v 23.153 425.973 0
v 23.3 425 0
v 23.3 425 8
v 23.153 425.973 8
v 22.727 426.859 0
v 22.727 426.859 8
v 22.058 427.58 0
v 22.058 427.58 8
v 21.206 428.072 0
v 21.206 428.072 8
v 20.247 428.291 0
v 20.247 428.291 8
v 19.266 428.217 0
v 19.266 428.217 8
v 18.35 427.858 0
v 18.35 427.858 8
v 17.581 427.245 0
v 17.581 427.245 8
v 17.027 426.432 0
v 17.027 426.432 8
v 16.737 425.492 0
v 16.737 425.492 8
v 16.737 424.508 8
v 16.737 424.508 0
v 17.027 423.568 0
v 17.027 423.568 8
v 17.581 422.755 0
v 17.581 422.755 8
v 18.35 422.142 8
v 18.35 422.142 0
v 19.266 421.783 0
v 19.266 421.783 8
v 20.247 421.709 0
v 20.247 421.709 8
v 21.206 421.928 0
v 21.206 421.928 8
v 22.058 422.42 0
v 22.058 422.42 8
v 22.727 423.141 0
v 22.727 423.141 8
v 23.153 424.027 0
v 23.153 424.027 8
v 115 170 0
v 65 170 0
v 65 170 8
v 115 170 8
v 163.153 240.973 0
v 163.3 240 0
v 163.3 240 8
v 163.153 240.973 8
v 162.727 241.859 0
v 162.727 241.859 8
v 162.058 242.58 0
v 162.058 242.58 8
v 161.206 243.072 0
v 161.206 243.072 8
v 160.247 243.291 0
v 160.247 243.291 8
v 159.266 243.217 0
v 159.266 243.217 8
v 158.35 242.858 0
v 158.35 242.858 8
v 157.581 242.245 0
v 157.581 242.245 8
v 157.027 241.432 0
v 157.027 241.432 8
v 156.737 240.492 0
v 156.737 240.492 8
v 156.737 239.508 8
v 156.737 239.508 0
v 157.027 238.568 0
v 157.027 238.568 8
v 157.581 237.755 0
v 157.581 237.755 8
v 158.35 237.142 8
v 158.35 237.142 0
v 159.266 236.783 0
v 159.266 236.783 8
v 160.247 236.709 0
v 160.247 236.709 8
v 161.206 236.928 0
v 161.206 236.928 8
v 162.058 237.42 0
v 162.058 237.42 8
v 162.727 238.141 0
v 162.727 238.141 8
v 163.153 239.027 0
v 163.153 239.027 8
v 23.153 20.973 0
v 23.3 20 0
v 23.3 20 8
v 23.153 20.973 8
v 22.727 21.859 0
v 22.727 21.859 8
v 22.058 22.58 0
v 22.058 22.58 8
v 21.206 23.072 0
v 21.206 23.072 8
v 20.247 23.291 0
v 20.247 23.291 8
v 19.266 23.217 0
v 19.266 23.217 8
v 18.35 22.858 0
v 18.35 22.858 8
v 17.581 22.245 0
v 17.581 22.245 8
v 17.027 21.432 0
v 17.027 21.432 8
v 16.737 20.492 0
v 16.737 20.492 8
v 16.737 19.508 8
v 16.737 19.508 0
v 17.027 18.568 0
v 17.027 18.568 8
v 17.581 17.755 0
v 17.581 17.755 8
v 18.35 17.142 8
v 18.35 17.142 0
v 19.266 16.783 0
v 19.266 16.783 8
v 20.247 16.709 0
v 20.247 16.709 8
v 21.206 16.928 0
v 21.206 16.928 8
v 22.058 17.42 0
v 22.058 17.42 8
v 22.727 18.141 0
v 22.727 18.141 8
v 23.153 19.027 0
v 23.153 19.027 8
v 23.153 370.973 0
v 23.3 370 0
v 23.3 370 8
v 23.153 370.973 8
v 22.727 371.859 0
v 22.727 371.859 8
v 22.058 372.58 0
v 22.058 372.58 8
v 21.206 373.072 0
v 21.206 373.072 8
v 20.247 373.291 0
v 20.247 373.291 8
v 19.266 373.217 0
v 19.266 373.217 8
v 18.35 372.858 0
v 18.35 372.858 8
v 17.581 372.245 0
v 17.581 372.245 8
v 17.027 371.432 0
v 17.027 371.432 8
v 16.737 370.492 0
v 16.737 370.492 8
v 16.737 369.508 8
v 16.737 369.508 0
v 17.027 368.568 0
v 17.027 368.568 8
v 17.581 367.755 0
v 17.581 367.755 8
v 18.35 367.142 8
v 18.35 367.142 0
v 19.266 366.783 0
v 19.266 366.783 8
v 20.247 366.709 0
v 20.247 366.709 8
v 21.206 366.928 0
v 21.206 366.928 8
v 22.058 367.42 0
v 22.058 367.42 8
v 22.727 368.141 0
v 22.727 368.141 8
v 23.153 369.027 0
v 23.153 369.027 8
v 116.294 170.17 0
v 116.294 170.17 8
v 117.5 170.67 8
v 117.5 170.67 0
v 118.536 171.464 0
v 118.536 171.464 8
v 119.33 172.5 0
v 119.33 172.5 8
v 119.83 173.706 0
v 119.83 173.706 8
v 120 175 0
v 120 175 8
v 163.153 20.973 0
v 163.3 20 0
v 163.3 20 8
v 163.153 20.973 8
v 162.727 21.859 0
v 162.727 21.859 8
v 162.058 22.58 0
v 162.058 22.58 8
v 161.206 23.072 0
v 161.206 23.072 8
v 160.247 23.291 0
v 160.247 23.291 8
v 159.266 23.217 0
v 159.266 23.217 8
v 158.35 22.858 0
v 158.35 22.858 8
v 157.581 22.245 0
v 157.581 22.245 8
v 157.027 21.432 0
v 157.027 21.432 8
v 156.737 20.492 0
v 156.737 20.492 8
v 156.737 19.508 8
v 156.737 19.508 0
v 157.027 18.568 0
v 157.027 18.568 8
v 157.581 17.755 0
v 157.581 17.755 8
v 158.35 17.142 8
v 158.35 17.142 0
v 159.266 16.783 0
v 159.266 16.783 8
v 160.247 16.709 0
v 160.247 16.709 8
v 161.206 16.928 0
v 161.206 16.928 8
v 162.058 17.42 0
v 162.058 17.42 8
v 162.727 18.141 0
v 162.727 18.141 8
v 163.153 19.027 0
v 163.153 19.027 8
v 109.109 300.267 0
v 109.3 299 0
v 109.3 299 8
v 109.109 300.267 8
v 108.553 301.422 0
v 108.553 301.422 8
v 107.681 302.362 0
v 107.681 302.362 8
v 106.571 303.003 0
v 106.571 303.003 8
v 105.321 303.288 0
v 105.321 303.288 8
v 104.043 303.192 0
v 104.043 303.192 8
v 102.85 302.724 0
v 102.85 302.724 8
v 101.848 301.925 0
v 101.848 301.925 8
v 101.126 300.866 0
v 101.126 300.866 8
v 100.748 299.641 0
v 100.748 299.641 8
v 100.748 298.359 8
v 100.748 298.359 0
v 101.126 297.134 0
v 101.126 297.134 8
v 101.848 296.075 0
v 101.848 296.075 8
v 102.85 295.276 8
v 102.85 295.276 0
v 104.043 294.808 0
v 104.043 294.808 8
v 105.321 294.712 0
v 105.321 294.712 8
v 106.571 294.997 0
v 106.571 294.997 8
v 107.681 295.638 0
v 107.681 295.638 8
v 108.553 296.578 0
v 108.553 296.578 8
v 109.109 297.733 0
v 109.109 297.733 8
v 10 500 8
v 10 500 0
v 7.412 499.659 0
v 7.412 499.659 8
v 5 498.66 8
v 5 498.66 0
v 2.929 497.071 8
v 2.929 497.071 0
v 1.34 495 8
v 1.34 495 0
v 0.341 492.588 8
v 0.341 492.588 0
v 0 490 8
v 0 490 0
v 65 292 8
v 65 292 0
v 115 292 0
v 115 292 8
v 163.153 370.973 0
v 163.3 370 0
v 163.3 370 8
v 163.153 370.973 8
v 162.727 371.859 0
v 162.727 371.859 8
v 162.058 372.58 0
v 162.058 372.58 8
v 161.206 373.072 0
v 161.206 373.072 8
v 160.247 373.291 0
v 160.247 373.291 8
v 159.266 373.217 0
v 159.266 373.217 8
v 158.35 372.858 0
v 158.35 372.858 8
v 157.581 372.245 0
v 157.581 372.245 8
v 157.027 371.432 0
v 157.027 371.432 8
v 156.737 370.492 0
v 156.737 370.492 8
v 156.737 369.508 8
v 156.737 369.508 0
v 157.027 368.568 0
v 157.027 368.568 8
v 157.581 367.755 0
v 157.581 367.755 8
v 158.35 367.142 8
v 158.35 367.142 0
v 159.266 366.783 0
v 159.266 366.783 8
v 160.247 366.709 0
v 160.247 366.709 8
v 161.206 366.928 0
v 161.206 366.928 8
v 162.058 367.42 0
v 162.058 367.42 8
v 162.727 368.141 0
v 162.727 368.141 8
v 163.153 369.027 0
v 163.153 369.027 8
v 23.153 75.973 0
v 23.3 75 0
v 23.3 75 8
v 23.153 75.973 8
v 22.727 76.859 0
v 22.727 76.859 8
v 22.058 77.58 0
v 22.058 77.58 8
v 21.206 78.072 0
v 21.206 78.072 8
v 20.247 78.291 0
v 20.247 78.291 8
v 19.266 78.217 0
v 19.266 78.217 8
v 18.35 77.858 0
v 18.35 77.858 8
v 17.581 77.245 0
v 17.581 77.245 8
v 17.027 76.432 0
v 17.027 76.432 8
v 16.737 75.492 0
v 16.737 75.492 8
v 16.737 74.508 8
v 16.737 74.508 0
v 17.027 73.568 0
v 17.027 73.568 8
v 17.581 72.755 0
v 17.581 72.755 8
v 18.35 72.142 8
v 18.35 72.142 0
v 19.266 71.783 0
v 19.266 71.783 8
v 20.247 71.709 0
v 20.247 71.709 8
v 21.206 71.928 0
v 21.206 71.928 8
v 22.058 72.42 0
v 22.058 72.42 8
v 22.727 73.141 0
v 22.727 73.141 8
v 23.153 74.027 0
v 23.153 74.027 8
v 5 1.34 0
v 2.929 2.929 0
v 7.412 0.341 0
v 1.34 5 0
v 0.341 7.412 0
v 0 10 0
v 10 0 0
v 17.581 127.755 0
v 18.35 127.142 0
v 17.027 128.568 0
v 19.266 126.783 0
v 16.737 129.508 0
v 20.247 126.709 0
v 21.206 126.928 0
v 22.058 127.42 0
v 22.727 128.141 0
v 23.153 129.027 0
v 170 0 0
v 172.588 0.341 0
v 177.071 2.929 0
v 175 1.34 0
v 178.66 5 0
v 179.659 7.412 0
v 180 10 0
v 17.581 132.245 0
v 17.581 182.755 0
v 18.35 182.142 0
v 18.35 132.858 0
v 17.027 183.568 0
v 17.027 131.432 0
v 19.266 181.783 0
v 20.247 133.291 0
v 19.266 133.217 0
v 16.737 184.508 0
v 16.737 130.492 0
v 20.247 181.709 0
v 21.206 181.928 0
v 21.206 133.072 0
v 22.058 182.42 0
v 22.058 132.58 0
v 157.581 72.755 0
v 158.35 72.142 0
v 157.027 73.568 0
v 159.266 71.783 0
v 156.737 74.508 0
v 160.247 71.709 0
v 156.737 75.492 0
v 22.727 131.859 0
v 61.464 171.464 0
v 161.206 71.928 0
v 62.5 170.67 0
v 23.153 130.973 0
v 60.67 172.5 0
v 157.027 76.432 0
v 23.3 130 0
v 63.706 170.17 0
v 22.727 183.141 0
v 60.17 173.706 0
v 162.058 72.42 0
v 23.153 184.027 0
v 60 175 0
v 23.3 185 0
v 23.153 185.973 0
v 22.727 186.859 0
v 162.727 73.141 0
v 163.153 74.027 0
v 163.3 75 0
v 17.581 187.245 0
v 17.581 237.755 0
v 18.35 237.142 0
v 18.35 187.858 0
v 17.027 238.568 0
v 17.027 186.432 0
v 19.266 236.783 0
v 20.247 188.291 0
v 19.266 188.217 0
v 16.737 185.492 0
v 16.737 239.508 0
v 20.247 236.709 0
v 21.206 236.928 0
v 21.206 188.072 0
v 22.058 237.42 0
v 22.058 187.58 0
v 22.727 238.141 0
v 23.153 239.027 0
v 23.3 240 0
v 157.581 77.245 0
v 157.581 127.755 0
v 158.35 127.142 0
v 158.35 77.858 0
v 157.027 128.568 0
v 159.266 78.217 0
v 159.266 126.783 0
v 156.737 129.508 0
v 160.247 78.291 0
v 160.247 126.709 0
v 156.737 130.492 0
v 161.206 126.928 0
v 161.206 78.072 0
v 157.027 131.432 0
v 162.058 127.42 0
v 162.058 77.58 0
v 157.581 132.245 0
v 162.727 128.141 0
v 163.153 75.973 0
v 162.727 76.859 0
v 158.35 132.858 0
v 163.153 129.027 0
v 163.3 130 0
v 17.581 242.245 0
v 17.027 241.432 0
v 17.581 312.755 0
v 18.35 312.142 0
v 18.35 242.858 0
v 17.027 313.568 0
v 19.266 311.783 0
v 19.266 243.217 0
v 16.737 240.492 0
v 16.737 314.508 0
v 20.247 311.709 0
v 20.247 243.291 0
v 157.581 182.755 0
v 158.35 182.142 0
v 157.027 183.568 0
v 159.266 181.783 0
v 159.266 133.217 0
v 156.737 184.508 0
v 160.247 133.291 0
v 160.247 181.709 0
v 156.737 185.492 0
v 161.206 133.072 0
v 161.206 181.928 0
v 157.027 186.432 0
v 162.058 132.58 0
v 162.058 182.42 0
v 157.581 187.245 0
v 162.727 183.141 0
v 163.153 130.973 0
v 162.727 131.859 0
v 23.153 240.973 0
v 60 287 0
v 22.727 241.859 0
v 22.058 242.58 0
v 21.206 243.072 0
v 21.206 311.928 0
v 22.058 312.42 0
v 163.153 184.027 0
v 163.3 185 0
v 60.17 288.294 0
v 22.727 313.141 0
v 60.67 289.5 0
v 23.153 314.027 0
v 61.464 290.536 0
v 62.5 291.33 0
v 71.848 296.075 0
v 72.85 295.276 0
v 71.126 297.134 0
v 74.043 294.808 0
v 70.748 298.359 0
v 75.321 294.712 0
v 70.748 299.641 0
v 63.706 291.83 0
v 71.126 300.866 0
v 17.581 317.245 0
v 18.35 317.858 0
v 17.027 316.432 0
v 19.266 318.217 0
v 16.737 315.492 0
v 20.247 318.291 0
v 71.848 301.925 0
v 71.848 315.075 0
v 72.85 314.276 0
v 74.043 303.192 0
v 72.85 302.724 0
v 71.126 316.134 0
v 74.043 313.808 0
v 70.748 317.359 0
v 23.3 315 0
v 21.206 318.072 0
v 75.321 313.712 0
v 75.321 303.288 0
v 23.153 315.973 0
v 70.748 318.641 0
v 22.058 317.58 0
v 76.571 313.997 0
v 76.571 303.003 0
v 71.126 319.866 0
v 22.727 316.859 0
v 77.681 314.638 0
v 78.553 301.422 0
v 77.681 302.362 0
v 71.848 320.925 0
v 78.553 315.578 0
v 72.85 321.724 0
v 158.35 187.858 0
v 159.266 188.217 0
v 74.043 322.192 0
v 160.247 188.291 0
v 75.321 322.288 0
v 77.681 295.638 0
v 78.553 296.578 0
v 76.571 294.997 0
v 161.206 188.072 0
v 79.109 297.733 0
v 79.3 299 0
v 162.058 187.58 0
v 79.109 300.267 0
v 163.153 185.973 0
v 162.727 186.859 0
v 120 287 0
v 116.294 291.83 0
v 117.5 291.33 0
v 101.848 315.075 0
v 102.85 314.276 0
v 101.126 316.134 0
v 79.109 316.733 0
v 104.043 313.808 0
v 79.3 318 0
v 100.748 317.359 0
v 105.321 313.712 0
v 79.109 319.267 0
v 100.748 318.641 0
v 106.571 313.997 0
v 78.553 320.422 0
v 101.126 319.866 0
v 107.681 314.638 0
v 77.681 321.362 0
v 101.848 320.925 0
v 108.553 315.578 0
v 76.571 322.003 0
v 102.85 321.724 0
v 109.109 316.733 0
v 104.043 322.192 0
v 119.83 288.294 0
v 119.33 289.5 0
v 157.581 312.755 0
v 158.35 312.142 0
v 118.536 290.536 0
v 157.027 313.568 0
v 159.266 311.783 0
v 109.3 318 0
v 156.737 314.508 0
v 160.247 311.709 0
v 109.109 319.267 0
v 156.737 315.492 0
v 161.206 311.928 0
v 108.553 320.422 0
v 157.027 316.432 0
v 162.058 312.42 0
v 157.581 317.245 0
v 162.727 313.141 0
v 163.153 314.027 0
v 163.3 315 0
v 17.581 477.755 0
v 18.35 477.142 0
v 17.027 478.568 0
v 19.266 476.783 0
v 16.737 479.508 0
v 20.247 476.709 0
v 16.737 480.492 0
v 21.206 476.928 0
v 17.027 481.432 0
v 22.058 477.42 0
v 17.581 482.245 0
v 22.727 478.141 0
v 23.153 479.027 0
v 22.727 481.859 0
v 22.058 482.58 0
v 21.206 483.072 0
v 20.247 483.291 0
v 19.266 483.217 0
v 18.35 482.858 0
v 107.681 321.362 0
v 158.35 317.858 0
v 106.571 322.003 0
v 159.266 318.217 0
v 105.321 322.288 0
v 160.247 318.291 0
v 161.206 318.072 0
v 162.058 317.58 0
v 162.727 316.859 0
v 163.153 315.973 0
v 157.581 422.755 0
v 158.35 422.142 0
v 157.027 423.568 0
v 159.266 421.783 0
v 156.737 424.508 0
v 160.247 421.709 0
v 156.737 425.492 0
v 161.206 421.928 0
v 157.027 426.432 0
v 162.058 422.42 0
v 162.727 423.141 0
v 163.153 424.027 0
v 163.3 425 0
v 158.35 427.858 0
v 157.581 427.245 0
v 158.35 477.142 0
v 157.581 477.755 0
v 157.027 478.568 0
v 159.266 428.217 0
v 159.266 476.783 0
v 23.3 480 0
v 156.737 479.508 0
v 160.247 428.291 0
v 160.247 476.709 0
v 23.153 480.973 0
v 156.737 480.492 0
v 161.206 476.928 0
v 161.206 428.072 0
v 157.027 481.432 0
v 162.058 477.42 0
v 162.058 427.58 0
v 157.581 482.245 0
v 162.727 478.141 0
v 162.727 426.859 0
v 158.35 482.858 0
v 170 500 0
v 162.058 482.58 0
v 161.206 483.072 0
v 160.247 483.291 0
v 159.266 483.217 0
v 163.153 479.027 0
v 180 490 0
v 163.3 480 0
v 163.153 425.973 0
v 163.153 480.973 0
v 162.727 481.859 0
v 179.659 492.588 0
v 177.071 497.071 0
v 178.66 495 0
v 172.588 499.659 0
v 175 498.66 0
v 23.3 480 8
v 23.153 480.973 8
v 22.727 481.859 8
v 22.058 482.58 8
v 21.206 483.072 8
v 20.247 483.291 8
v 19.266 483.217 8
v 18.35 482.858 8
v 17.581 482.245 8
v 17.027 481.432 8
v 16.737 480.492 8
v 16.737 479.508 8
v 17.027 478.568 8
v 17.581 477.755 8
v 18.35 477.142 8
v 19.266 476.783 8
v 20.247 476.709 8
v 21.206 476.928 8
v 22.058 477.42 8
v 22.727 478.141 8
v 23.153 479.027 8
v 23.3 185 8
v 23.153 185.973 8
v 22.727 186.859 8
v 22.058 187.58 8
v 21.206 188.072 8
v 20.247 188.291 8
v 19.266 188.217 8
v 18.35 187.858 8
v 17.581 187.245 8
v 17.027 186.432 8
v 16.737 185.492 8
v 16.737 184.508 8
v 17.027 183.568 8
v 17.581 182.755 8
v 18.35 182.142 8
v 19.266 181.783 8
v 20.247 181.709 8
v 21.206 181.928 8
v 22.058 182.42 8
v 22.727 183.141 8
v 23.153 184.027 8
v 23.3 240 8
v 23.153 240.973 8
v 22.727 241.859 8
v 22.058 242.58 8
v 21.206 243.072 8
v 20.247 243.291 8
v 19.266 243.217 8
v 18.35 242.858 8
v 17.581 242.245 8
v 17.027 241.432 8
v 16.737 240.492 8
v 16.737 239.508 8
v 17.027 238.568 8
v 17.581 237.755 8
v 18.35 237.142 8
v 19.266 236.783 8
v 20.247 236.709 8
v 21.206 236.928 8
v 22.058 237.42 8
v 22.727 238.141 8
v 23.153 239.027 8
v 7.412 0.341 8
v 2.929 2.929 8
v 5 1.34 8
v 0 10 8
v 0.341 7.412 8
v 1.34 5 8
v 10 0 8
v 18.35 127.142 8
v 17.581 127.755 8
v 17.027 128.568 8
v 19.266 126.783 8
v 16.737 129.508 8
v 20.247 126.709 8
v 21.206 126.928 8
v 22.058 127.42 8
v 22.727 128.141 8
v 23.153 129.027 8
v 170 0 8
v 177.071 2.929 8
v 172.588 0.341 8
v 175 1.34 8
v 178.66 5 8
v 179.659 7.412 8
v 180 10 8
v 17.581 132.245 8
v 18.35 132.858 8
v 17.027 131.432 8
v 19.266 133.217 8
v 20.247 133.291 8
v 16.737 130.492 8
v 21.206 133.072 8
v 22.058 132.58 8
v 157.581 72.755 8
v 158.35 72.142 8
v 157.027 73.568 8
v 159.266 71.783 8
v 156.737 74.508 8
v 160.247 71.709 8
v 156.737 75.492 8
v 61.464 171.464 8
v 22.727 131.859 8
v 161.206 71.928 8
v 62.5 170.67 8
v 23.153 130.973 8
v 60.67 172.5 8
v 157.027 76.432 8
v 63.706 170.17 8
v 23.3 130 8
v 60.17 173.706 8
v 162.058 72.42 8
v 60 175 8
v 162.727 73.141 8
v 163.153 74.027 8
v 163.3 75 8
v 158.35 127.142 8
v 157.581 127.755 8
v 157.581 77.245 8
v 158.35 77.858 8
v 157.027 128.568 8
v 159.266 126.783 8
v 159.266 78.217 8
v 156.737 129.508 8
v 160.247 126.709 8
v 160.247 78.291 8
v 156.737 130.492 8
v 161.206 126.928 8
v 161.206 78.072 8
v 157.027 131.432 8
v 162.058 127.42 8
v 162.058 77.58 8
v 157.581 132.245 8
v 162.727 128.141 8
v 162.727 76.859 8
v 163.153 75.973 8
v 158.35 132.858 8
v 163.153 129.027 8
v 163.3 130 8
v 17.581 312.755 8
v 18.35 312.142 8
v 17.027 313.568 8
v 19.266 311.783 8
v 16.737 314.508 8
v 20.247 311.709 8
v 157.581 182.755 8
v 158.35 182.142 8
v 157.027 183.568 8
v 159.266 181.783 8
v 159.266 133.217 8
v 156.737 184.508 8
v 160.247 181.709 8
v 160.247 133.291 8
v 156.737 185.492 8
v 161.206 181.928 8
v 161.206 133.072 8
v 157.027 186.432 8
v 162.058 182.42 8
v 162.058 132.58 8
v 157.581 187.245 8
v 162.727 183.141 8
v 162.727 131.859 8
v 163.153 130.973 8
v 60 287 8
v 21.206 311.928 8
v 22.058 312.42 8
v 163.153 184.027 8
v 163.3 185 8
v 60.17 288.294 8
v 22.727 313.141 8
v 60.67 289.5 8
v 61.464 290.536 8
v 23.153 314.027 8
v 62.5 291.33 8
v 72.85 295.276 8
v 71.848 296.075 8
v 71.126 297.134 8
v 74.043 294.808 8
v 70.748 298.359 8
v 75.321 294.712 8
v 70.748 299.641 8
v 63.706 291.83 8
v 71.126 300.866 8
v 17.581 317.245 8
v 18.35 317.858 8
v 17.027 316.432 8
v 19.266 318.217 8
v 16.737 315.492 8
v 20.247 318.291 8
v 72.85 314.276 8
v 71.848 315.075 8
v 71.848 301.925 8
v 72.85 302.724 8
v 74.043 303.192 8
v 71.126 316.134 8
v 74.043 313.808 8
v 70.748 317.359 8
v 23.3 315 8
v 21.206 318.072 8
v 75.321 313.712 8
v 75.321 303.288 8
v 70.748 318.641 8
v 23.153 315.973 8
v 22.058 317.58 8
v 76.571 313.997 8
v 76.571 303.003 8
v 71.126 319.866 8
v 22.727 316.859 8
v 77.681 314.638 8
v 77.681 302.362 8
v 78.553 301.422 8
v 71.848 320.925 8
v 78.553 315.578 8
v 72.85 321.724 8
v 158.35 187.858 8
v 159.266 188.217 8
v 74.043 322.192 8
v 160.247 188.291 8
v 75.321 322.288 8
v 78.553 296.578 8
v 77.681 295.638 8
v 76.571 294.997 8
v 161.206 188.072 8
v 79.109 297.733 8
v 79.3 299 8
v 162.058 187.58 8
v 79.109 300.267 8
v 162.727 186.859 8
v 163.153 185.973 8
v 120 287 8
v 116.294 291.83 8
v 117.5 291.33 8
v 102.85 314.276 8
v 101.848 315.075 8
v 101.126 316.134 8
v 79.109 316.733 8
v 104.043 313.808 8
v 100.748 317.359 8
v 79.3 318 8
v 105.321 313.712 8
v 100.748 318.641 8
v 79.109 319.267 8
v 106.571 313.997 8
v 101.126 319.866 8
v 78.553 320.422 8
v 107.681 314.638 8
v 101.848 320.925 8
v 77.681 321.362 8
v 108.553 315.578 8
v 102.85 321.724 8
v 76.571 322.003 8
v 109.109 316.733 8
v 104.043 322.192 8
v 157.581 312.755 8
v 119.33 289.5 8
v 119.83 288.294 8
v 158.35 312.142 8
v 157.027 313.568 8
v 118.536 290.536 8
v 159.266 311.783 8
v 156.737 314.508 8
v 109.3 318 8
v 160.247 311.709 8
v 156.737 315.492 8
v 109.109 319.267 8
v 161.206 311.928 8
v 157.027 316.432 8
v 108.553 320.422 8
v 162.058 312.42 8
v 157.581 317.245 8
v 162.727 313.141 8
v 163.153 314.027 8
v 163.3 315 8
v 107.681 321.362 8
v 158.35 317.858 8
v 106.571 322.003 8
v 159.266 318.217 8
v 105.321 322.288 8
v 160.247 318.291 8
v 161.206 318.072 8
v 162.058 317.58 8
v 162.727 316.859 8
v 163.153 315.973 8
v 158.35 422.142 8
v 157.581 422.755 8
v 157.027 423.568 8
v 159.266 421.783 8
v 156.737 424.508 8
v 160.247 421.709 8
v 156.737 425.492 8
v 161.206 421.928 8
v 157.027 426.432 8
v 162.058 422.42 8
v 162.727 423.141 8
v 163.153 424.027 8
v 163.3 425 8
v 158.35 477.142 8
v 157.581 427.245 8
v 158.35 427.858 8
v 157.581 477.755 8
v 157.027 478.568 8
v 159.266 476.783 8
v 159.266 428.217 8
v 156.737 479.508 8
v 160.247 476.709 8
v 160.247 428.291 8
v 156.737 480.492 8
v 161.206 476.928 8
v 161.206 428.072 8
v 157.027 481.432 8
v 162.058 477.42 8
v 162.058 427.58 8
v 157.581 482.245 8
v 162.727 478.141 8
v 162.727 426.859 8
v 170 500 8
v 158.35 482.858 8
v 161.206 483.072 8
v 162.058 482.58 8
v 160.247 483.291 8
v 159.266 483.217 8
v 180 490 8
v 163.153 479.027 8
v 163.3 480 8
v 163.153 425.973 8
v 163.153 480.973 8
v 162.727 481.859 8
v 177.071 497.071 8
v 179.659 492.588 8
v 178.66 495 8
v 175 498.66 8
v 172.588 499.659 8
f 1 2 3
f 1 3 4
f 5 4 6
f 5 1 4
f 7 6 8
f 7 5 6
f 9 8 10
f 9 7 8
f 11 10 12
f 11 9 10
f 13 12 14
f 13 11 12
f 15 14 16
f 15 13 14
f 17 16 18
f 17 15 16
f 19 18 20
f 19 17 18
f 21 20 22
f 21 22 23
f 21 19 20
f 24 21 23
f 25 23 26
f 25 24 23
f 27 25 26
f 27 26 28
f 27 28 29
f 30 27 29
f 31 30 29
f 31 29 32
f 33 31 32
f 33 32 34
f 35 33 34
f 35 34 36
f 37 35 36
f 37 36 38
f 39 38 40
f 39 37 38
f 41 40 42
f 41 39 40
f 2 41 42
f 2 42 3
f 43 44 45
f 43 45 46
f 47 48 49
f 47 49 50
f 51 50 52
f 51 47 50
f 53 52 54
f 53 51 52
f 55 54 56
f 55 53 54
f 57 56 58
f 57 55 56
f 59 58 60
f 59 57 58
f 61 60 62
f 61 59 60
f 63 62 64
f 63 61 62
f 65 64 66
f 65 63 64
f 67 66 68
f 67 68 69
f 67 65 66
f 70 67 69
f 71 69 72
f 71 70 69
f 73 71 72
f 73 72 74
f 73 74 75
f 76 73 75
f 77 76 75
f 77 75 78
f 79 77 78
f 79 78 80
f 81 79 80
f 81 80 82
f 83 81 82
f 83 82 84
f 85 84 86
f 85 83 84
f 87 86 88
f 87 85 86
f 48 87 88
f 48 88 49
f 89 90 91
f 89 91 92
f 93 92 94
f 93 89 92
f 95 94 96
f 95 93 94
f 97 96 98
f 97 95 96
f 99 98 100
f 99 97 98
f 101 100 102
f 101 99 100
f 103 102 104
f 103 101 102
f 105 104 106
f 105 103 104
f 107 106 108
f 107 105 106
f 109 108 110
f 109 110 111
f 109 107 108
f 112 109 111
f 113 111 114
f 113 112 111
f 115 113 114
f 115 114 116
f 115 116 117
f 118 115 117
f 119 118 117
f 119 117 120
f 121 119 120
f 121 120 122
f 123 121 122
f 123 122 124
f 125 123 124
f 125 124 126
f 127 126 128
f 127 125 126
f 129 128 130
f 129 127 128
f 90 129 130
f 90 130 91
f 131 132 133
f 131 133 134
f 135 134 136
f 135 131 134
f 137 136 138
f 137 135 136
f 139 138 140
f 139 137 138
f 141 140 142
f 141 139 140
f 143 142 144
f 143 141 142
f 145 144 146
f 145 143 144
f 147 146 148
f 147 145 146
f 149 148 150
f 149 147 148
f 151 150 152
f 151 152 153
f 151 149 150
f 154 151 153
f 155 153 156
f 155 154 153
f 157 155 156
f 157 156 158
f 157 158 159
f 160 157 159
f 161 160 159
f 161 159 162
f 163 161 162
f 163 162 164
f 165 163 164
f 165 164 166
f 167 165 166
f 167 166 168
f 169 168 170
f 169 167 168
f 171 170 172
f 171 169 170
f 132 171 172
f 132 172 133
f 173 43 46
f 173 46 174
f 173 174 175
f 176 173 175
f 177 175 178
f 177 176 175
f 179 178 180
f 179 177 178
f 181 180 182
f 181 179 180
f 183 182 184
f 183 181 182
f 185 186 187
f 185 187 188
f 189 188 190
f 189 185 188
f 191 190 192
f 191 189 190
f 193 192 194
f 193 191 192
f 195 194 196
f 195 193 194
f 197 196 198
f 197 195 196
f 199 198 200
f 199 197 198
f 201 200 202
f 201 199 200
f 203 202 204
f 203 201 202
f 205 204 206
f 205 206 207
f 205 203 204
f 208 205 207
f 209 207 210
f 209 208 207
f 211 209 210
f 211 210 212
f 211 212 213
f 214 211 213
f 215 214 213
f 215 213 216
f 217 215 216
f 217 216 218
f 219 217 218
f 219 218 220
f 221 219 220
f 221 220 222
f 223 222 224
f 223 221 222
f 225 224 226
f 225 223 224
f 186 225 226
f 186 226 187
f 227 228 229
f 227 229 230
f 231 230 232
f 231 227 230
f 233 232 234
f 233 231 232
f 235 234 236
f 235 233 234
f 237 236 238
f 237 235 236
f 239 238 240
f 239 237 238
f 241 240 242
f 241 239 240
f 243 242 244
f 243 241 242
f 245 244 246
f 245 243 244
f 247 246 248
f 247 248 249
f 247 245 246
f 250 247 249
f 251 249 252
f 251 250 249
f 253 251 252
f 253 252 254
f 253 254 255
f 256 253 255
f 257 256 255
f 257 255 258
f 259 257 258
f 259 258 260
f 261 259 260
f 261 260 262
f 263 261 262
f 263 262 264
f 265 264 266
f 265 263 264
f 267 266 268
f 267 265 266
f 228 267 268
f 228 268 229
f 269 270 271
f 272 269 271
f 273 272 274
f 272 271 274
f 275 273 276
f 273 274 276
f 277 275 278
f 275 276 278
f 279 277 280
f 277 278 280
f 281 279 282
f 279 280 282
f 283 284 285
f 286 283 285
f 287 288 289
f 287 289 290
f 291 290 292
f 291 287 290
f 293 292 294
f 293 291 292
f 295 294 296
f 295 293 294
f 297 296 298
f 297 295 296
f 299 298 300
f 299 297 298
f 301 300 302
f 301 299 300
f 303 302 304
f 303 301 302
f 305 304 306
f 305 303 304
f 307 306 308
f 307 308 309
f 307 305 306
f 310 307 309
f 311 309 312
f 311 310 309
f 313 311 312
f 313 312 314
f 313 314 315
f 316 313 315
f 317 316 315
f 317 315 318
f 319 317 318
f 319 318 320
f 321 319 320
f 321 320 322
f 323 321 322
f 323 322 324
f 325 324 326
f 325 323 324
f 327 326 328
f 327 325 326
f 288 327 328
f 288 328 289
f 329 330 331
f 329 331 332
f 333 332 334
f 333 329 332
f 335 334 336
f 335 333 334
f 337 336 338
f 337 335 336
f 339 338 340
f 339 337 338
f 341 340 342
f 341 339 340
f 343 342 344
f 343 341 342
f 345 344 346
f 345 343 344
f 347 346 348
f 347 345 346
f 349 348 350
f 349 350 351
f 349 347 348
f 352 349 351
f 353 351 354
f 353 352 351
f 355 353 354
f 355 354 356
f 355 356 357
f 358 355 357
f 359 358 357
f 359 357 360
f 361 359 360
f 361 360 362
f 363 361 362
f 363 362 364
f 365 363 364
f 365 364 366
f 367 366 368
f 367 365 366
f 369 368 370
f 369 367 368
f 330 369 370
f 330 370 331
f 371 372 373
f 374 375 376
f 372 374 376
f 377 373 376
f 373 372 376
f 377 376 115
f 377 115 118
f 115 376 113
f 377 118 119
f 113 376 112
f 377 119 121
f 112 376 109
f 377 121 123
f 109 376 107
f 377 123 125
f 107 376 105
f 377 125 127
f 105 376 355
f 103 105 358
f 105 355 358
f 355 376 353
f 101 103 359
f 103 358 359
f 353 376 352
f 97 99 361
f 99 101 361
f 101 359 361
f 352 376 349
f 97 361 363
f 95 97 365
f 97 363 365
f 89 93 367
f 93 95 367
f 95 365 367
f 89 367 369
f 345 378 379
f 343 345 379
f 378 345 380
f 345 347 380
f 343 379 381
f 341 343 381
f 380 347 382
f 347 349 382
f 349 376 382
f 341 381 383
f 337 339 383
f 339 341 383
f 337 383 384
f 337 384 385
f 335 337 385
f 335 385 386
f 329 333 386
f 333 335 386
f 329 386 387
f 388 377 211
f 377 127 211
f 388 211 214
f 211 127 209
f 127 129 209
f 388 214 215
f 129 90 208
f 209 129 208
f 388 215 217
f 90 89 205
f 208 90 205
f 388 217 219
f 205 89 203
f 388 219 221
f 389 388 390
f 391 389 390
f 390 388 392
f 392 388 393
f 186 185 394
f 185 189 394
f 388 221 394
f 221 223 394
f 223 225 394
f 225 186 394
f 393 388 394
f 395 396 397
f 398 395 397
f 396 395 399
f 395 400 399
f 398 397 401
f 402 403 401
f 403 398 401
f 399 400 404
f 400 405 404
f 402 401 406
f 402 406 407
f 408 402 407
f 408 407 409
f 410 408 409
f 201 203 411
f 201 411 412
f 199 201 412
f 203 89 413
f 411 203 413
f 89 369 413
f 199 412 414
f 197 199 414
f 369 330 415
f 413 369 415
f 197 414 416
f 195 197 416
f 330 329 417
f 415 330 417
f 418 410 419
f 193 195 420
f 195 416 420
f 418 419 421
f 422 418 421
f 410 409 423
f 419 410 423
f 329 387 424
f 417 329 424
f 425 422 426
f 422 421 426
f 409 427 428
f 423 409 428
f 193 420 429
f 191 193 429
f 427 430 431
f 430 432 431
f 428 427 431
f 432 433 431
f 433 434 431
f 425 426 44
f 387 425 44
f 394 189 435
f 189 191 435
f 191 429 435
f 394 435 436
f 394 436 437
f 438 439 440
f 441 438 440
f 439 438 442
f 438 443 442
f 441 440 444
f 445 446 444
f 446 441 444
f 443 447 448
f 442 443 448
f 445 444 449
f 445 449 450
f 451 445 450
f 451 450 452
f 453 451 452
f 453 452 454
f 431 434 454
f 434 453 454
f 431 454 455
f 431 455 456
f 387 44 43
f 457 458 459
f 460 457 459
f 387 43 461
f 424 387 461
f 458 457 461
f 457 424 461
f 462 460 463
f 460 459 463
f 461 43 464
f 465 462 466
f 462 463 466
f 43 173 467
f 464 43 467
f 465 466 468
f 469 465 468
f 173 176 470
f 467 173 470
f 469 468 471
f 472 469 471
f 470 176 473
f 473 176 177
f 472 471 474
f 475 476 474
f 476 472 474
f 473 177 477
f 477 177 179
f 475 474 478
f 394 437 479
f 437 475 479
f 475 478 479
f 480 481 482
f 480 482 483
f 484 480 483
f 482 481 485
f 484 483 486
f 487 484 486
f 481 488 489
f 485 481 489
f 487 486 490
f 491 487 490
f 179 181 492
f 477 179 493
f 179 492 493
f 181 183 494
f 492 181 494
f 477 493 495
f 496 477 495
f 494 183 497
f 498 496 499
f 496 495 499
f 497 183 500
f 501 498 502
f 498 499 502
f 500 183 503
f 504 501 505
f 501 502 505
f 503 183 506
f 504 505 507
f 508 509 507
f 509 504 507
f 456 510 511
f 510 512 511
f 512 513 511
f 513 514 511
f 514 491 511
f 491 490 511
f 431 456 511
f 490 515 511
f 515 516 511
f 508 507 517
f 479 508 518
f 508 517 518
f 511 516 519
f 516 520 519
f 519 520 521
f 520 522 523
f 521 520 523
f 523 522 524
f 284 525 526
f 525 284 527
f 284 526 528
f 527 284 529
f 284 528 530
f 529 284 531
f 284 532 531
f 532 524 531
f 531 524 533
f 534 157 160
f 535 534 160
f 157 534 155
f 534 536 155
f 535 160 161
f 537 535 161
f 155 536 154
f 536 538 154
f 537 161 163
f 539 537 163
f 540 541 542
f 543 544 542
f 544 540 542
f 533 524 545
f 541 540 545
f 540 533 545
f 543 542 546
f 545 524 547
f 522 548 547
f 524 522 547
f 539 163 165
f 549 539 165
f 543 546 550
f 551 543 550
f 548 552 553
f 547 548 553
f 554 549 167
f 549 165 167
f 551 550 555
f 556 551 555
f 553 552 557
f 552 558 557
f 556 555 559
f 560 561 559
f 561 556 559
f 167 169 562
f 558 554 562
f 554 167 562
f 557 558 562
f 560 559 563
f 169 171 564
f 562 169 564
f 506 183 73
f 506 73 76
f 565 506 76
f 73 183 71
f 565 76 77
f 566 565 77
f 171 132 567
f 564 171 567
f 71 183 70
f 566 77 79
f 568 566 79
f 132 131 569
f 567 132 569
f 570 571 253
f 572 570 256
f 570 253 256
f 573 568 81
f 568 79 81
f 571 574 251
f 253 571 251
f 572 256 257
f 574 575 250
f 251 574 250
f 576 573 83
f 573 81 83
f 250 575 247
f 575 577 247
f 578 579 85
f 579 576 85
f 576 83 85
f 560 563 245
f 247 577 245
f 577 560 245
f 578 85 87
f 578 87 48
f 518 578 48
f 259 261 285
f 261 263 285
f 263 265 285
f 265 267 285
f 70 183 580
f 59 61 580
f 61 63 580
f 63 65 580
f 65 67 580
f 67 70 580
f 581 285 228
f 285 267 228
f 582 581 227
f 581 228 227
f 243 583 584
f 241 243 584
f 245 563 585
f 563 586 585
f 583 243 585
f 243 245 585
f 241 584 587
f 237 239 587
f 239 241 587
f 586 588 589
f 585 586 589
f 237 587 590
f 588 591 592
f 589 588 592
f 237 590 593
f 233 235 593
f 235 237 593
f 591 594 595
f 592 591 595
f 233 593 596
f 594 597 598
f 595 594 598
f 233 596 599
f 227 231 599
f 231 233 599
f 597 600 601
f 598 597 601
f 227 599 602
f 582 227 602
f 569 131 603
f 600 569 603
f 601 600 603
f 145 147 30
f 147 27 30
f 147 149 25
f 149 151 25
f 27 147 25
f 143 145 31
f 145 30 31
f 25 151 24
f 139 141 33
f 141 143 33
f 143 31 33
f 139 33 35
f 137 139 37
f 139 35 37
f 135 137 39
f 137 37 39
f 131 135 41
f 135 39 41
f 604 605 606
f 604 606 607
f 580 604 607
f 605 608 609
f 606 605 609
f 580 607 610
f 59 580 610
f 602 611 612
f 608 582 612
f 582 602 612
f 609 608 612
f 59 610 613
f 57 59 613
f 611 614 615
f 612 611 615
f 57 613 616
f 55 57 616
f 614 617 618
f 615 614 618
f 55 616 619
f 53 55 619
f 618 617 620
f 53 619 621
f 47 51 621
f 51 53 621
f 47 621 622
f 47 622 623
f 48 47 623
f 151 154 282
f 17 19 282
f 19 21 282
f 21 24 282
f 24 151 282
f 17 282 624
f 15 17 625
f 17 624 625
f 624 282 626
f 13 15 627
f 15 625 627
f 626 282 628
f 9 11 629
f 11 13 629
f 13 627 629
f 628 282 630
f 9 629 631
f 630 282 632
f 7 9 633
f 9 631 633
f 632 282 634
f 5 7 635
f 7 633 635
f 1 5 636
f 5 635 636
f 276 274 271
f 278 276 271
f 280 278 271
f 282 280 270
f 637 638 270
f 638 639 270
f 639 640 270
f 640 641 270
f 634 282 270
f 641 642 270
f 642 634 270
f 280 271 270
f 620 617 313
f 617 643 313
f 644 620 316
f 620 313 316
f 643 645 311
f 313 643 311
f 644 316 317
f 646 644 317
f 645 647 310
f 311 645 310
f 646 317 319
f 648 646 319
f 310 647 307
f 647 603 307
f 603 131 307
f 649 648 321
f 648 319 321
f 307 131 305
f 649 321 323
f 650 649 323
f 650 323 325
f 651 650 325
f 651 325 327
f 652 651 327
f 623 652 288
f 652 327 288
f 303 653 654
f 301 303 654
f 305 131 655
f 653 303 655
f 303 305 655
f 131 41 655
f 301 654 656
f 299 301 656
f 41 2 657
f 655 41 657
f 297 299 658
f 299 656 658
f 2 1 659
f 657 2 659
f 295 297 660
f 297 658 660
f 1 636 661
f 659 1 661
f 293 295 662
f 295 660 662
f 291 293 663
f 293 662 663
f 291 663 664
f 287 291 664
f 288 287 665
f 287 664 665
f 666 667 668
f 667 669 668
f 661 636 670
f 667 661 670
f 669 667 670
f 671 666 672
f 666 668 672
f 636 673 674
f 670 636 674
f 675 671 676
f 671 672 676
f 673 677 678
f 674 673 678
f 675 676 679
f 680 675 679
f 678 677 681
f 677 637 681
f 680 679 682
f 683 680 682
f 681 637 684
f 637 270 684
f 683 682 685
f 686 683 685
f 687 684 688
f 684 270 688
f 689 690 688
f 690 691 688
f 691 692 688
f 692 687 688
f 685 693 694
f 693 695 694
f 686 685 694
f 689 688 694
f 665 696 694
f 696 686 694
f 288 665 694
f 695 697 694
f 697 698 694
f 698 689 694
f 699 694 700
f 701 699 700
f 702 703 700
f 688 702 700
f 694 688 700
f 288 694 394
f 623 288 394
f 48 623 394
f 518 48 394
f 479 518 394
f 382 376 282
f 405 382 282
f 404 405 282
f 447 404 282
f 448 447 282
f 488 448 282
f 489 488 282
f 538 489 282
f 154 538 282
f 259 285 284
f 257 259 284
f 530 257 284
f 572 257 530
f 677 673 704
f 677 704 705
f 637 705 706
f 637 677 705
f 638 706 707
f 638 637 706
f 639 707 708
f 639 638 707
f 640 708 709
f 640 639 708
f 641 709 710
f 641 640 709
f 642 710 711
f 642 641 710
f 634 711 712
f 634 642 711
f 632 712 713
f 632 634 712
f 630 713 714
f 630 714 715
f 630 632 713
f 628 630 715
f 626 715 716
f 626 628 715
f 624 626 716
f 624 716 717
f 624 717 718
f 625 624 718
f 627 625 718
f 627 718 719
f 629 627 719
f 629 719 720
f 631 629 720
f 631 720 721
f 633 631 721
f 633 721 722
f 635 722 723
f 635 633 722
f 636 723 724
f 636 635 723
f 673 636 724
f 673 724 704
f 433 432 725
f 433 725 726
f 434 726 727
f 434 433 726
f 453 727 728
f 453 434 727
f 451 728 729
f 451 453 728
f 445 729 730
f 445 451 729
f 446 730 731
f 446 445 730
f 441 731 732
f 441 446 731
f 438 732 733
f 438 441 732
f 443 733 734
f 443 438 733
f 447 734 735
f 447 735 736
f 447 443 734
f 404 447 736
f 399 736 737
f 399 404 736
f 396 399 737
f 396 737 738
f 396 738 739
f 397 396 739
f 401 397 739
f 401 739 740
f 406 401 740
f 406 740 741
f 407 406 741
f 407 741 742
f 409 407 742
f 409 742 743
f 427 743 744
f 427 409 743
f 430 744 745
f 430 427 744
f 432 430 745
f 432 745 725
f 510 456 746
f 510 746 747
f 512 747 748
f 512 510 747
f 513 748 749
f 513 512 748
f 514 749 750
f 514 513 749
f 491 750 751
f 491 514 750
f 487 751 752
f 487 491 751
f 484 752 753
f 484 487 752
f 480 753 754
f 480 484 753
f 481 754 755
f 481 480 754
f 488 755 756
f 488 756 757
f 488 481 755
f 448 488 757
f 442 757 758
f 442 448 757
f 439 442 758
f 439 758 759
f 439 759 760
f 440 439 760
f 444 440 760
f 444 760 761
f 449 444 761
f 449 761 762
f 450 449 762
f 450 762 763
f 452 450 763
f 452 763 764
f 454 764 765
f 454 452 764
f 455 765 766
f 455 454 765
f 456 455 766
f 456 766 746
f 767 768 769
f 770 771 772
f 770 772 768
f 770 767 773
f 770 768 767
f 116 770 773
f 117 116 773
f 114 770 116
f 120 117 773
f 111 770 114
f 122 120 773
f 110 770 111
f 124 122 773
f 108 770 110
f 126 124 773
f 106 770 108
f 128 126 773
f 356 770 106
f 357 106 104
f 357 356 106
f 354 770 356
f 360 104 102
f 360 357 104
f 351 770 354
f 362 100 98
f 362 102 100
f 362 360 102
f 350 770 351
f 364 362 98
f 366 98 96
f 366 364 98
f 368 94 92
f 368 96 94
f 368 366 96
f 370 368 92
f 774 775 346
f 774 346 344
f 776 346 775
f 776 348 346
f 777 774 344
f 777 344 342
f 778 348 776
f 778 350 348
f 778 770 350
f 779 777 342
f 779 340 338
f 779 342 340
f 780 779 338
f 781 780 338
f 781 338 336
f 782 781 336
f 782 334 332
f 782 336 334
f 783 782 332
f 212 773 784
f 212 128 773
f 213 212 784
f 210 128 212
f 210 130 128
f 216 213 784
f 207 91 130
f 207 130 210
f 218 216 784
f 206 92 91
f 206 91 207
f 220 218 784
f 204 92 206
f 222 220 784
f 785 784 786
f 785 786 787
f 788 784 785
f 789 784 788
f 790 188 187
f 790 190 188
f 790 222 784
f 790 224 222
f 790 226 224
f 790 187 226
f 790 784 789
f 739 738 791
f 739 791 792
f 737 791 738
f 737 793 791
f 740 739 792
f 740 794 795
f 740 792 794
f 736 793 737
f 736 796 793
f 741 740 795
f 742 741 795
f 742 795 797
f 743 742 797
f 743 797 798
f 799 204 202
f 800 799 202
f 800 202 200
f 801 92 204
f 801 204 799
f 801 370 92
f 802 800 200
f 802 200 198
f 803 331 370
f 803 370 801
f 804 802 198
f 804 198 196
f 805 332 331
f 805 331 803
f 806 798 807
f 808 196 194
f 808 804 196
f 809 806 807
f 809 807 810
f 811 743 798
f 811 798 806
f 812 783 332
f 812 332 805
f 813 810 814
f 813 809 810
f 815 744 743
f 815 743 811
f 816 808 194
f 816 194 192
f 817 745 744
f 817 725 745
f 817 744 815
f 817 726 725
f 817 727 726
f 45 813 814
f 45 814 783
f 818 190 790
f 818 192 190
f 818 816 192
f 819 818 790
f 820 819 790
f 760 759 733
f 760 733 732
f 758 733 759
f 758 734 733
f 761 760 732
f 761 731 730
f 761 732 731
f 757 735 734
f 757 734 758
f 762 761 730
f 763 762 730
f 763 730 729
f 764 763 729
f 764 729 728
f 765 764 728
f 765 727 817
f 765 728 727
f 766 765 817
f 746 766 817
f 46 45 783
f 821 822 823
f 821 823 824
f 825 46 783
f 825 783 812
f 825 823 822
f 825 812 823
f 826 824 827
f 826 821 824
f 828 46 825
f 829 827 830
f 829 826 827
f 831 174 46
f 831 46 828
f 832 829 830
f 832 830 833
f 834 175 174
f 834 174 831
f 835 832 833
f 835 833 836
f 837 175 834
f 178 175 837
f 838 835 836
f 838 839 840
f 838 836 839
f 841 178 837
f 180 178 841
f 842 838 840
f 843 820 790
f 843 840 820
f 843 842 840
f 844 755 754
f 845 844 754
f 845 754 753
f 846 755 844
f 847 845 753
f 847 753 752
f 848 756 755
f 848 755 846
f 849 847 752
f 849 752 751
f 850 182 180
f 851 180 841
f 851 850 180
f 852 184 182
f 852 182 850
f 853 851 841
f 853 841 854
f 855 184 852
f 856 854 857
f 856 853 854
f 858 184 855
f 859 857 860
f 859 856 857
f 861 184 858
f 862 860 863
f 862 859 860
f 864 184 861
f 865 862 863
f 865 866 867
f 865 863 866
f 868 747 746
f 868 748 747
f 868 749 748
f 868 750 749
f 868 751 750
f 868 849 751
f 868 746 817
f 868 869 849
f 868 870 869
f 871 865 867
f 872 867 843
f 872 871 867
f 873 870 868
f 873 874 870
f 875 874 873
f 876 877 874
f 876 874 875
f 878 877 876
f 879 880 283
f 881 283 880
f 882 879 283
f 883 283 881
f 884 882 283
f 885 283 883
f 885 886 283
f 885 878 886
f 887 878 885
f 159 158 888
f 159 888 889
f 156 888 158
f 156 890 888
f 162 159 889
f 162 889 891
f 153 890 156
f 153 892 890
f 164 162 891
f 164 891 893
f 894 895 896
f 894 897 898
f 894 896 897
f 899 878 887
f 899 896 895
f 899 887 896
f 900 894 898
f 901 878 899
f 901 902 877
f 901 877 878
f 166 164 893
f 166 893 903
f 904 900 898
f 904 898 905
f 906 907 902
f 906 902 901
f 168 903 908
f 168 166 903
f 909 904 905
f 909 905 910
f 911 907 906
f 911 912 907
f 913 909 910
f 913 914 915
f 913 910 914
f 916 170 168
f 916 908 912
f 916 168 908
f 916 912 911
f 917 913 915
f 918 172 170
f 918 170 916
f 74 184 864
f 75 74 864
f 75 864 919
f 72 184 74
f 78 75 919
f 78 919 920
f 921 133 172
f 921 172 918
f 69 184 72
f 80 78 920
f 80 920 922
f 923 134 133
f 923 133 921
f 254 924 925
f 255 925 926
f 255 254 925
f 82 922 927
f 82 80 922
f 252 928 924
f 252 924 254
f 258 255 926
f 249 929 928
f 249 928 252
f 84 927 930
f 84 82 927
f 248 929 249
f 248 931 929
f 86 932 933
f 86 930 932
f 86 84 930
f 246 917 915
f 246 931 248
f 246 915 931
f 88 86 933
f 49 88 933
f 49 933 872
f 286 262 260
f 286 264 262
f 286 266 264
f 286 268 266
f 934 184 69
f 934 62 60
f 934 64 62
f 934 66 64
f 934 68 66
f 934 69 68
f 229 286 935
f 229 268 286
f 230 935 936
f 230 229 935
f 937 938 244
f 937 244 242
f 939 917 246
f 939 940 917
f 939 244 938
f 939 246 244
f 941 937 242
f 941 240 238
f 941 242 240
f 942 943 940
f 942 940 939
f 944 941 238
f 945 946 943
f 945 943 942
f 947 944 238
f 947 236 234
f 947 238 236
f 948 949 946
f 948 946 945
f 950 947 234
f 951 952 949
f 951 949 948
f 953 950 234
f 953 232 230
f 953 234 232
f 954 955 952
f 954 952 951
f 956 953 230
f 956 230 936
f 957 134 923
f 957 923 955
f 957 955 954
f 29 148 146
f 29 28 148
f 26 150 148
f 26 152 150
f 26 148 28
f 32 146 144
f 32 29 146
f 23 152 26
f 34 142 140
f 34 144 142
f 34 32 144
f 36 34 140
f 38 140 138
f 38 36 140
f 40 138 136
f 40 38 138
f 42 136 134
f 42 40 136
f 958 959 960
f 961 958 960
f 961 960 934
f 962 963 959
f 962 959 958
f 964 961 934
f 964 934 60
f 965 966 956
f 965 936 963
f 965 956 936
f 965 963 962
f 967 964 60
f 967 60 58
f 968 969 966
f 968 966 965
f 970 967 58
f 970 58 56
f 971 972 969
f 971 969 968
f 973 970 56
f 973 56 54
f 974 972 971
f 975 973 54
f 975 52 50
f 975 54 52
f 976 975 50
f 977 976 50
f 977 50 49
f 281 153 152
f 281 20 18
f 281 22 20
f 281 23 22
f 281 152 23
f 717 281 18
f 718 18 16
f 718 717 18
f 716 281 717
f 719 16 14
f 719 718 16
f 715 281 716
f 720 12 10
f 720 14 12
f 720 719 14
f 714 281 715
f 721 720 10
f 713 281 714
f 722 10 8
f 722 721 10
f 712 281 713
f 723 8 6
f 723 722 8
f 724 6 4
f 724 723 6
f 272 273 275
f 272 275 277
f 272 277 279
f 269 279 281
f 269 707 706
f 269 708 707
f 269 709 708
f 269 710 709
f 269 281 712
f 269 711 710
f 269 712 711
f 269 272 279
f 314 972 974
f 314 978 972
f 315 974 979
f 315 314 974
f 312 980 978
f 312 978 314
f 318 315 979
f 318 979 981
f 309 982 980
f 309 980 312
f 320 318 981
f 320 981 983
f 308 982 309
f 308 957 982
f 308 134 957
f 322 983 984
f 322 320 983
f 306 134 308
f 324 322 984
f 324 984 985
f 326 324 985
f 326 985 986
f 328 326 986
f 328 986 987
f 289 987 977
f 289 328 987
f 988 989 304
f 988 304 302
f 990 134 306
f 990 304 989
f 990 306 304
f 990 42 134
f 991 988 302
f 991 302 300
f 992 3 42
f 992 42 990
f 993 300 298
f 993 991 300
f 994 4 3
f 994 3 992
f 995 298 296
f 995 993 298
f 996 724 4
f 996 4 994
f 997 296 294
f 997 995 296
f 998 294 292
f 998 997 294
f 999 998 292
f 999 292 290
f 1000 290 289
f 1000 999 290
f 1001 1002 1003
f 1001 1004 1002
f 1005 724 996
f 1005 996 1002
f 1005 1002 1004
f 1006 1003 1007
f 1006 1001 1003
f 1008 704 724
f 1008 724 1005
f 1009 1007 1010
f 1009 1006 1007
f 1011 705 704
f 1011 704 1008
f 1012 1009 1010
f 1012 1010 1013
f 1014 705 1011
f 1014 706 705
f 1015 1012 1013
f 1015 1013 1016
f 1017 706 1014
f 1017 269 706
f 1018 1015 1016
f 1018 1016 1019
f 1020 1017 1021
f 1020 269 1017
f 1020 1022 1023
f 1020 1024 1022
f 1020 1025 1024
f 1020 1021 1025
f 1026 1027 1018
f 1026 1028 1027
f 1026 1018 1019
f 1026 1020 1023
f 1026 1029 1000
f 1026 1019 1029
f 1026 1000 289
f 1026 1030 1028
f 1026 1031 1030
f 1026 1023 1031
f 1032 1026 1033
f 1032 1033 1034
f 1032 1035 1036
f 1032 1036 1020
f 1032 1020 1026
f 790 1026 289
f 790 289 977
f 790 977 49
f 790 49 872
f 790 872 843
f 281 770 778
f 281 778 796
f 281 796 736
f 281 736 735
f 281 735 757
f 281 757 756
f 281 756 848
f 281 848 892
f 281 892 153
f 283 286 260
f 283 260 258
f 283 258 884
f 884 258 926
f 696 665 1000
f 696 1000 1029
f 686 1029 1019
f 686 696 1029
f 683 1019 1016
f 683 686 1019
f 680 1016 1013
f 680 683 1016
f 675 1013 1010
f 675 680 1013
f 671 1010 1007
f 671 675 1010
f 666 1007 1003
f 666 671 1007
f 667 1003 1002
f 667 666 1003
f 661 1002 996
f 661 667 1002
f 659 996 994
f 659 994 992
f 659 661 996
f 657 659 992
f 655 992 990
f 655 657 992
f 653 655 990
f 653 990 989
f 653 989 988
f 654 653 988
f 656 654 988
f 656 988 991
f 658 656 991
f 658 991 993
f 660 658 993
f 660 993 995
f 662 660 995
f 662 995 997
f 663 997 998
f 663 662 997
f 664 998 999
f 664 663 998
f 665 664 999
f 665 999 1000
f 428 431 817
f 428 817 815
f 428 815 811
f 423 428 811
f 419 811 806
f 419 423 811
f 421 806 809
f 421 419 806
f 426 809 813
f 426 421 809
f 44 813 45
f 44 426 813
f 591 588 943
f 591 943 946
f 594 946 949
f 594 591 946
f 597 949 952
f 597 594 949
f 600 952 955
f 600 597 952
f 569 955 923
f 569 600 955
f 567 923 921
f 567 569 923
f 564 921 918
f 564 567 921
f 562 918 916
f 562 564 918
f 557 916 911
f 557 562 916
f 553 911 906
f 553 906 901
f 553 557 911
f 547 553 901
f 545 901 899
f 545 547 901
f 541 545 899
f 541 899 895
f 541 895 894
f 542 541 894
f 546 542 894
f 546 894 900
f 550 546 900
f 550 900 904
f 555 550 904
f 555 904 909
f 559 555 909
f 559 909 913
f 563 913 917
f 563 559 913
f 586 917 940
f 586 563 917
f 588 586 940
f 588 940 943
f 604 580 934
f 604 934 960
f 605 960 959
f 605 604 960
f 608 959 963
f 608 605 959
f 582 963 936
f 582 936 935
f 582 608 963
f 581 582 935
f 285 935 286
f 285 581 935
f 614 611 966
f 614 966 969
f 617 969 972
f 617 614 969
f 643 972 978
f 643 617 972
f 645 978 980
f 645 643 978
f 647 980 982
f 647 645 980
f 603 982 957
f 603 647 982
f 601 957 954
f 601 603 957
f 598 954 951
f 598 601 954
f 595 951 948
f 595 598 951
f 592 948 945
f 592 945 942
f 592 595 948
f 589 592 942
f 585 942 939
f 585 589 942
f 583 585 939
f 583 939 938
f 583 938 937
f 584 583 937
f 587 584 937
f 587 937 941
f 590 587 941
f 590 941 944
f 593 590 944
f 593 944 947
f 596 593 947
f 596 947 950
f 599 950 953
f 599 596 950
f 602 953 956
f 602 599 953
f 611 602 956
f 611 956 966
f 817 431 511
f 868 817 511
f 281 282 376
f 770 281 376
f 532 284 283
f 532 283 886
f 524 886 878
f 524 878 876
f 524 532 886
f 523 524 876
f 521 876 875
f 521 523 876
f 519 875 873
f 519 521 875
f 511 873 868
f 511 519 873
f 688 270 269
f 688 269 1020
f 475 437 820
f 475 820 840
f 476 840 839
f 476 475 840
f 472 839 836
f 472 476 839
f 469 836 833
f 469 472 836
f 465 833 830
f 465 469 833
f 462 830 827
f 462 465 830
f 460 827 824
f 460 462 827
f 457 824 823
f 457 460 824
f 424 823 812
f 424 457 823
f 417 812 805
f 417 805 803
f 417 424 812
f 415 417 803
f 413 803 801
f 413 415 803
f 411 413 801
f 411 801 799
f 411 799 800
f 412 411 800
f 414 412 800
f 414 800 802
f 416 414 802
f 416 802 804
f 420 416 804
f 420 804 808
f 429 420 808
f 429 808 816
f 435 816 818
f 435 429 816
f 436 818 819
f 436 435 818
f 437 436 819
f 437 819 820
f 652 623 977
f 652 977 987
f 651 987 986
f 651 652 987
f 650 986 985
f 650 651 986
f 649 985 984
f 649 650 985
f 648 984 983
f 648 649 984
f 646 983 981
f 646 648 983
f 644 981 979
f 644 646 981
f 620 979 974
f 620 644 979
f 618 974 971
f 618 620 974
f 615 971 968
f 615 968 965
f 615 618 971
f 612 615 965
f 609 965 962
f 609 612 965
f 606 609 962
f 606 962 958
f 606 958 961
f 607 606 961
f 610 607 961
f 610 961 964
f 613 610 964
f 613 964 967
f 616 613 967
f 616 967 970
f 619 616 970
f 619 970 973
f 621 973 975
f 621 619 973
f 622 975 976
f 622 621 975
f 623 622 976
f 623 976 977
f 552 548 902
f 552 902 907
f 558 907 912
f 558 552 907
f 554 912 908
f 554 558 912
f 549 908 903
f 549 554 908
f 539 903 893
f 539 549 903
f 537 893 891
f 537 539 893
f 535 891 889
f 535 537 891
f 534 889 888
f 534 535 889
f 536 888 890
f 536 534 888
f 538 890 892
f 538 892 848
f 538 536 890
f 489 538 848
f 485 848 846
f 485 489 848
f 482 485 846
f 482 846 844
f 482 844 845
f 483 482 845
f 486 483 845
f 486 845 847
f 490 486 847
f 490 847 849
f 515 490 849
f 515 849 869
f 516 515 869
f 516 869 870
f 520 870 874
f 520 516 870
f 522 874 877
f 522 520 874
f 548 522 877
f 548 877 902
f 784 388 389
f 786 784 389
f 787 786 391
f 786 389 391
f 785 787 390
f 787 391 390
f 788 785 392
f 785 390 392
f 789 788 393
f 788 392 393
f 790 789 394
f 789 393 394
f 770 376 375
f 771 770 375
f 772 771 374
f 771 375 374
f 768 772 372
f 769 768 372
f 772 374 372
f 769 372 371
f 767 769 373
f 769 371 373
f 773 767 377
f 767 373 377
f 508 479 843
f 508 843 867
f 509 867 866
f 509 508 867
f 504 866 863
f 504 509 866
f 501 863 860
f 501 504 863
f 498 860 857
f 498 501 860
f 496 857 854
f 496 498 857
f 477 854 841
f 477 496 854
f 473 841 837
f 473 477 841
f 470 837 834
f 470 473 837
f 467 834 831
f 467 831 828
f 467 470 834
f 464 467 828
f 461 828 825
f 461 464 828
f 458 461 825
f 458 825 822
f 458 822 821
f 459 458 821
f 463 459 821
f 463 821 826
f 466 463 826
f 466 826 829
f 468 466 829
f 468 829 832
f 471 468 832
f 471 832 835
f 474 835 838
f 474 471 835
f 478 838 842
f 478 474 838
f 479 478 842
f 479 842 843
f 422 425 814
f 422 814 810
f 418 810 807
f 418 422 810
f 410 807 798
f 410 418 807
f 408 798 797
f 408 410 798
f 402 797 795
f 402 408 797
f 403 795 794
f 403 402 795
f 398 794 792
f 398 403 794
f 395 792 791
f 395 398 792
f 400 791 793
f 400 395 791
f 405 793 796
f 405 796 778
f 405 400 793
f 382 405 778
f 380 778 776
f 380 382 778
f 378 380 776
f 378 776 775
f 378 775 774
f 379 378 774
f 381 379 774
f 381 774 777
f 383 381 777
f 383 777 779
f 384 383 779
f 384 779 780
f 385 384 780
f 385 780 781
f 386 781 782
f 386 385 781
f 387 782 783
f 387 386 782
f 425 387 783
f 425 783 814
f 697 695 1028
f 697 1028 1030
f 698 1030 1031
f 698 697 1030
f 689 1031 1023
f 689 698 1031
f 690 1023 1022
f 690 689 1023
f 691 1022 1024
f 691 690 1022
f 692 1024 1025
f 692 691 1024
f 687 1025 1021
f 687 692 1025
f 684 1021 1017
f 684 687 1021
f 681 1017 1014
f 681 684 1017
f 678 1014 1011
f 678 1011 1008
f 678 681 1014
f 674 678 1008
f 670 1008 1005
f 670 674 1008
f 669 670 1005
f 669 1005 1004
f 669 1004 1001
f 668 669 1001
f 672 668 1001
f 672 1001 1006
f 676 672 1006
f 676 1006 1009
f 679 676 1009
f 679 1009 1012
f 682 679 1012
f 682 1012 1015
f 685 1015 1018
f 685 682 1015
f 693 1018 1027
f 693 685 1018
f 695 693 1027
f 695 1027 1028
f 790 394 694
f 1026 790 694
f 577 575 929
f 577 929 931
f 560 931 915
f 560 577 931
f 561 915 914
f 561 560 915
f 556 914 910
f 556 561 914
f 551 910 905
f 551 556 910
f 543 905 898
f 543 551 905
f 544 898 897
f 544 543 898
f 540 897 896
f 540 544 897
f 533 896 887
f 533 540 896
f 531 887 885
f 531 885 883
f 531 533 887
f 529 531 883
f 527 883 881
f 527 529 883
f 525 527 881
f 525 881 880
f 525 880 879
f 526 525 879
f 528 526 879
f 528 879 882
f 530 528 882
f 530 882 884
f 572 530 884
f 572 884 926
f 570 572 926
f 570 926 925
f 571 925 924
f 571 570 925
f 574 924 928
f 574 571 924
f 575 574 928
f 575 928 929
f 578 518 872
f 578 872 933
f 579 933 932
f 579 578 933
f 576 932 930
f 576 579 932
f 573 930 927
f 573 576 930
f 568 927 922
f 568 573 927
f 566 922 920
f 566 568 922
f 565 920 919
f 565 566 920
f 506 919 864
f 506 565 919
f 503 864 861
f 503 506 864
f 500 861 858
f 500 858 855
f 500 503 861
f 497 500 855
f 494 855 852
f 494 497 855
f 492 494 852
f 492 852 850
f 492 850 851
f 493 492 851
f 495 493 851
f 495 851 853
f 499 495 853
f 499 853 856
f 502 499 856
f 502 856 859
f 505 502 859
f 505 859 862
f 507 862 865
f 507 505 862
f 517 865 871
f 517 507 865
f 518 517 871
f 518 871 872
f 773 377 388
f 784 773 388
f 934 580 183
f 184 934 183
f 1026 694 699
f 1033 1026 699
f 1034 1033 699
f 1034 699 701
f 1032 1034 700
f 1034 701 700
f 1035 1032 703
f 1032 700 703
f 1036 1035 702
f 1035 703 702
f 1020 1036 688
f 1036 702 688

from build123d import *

# Parameters (mm, degrees)
SKETCH_R   = 4.3
SKETCH_R_2 = 3.3
PAD_DEPTH  = 8


with BuildPart() as part:
    # Sketch → Pad (new body)
    with BuildSketch(Plane.XY):
        with BuildLine():
            Line((180, 10), (180, 490))
            ThreePointArc((180, 490), (177.071068, 497.071068), (170, 500))
            Line((10, 500), (170, 500))
            ThreePointArc((10, 500), (2.928932, 497.071068), (0, 490))
            Line((0, 490), (0, 10))
            ThreePointArc((0, 10), (2.928932, 2.928932), (10, 0))
            Line((10, 0), (170, 0))
            ThreePointArc((170, 0), (177.071068, 2.928932), (180, 10))
        make_face()
        with Locations((75, 318)):
            Circle(SKETCH_R, mode=Mode.SUBTRACT)
        with Locations((105, 318)):
            Circle(SKETCH_R, mode=Mode.SUBTRACT)
        with Locations((105, 299)):
            Circle(SKETCH_R, mode=Mode.SUBTRACT)
        with Locations((75, 299)):
            Circle(SKETCH_R, mode=Mode.SUBTRACT)
        with Locations((20, 20)):
            Circle(SKETCH_R_2, mode=Mode.SUBTRACT)
        with Locations((20, 75)):
            Circle(SKETCH_R_2, mode=Mode.SUBTRACT)
        with Locations((20, 130)):
            Circle(SKETCH_R_2, mode=Mode.SUBTRACT)
        with Locations((20, 185)):
            Circle(SKETCH_R_2, mode=Mode.SUBTRACT)
        with Locations((20, 480)):
            Circle(SKETCH_R_2, mode=Mode.SUBTRACT)
        with Locations((20, 425)):
            Circle(SKETCH_R_2, mode=Mode.SUBTRACT)
        with Locations((20, 370)):
            Circle(SKETCH_R_2, mode=Mode.SUBTRACT)
        with Locations((20, 315)):
            Circle(SKETCH_R_2, mode=Mode.SUBTRACT)
        with Locations((20, 240)):
            Circle(SKETCH_R_2, mode=Mode.SUBTRACT)
        with Locations((160, 480)):
            Circle(SKETCH_R_2, mode=Mode.SUBTRACT)
        with Locations((160, 425)):
            Circle(SKETCH_R_2, mode=Mode.SUBTRACT)
        with Locations((160, 370)):
            Circle(SKETCH_R_2, mode=Mode.SUBTRACT)
        with Locations((160, 315)):
            Circle(SKETCH_R_2, mode=Mode.SUBTRACT)
        with Locations((160, 240)):
            Circle(SKETCH_R_2, mode=Mode.SUBTRACT)
        with Locations((160, 20)):
            Circle(SKETCH_R_2, mode=Mode.SUBTRACT)
        with Locations((160, 75)):
            Circle(SKETCH_R_2, mode=Mode.SUBTRACT)
        with Locations((160, 130)):
            Circle(SKETCH_R_2, mode=Mode.SUBTRACT)
        with Locations((160, 185)):
            Circle(SKETCH_R_2, mode=Mode.SUBTRACT)
        with BuildLine():
            Line((65, 170), (115, 170))
            ThreePointArc((115, 170), (118.535534, 171.464466), (120, 175))
            Line((120, 287), (120, 175))
            ThreePointArc((120, 287), (118.535534, 290.535534), (115, 292))
            Line((65, 292), (115, 292))
            ThreePointArc((65, 292), (61.464466, 290.535534), (60, 287))
            Line((60, 175), (60, 287))
            ThreePointArc((60, 175), (61.464466, 171.464466), (65, 170))
        make_face(mode=Mode.SUBTRACT)
    extrude(amount=PAD_DEPTH)


solid = part.part
